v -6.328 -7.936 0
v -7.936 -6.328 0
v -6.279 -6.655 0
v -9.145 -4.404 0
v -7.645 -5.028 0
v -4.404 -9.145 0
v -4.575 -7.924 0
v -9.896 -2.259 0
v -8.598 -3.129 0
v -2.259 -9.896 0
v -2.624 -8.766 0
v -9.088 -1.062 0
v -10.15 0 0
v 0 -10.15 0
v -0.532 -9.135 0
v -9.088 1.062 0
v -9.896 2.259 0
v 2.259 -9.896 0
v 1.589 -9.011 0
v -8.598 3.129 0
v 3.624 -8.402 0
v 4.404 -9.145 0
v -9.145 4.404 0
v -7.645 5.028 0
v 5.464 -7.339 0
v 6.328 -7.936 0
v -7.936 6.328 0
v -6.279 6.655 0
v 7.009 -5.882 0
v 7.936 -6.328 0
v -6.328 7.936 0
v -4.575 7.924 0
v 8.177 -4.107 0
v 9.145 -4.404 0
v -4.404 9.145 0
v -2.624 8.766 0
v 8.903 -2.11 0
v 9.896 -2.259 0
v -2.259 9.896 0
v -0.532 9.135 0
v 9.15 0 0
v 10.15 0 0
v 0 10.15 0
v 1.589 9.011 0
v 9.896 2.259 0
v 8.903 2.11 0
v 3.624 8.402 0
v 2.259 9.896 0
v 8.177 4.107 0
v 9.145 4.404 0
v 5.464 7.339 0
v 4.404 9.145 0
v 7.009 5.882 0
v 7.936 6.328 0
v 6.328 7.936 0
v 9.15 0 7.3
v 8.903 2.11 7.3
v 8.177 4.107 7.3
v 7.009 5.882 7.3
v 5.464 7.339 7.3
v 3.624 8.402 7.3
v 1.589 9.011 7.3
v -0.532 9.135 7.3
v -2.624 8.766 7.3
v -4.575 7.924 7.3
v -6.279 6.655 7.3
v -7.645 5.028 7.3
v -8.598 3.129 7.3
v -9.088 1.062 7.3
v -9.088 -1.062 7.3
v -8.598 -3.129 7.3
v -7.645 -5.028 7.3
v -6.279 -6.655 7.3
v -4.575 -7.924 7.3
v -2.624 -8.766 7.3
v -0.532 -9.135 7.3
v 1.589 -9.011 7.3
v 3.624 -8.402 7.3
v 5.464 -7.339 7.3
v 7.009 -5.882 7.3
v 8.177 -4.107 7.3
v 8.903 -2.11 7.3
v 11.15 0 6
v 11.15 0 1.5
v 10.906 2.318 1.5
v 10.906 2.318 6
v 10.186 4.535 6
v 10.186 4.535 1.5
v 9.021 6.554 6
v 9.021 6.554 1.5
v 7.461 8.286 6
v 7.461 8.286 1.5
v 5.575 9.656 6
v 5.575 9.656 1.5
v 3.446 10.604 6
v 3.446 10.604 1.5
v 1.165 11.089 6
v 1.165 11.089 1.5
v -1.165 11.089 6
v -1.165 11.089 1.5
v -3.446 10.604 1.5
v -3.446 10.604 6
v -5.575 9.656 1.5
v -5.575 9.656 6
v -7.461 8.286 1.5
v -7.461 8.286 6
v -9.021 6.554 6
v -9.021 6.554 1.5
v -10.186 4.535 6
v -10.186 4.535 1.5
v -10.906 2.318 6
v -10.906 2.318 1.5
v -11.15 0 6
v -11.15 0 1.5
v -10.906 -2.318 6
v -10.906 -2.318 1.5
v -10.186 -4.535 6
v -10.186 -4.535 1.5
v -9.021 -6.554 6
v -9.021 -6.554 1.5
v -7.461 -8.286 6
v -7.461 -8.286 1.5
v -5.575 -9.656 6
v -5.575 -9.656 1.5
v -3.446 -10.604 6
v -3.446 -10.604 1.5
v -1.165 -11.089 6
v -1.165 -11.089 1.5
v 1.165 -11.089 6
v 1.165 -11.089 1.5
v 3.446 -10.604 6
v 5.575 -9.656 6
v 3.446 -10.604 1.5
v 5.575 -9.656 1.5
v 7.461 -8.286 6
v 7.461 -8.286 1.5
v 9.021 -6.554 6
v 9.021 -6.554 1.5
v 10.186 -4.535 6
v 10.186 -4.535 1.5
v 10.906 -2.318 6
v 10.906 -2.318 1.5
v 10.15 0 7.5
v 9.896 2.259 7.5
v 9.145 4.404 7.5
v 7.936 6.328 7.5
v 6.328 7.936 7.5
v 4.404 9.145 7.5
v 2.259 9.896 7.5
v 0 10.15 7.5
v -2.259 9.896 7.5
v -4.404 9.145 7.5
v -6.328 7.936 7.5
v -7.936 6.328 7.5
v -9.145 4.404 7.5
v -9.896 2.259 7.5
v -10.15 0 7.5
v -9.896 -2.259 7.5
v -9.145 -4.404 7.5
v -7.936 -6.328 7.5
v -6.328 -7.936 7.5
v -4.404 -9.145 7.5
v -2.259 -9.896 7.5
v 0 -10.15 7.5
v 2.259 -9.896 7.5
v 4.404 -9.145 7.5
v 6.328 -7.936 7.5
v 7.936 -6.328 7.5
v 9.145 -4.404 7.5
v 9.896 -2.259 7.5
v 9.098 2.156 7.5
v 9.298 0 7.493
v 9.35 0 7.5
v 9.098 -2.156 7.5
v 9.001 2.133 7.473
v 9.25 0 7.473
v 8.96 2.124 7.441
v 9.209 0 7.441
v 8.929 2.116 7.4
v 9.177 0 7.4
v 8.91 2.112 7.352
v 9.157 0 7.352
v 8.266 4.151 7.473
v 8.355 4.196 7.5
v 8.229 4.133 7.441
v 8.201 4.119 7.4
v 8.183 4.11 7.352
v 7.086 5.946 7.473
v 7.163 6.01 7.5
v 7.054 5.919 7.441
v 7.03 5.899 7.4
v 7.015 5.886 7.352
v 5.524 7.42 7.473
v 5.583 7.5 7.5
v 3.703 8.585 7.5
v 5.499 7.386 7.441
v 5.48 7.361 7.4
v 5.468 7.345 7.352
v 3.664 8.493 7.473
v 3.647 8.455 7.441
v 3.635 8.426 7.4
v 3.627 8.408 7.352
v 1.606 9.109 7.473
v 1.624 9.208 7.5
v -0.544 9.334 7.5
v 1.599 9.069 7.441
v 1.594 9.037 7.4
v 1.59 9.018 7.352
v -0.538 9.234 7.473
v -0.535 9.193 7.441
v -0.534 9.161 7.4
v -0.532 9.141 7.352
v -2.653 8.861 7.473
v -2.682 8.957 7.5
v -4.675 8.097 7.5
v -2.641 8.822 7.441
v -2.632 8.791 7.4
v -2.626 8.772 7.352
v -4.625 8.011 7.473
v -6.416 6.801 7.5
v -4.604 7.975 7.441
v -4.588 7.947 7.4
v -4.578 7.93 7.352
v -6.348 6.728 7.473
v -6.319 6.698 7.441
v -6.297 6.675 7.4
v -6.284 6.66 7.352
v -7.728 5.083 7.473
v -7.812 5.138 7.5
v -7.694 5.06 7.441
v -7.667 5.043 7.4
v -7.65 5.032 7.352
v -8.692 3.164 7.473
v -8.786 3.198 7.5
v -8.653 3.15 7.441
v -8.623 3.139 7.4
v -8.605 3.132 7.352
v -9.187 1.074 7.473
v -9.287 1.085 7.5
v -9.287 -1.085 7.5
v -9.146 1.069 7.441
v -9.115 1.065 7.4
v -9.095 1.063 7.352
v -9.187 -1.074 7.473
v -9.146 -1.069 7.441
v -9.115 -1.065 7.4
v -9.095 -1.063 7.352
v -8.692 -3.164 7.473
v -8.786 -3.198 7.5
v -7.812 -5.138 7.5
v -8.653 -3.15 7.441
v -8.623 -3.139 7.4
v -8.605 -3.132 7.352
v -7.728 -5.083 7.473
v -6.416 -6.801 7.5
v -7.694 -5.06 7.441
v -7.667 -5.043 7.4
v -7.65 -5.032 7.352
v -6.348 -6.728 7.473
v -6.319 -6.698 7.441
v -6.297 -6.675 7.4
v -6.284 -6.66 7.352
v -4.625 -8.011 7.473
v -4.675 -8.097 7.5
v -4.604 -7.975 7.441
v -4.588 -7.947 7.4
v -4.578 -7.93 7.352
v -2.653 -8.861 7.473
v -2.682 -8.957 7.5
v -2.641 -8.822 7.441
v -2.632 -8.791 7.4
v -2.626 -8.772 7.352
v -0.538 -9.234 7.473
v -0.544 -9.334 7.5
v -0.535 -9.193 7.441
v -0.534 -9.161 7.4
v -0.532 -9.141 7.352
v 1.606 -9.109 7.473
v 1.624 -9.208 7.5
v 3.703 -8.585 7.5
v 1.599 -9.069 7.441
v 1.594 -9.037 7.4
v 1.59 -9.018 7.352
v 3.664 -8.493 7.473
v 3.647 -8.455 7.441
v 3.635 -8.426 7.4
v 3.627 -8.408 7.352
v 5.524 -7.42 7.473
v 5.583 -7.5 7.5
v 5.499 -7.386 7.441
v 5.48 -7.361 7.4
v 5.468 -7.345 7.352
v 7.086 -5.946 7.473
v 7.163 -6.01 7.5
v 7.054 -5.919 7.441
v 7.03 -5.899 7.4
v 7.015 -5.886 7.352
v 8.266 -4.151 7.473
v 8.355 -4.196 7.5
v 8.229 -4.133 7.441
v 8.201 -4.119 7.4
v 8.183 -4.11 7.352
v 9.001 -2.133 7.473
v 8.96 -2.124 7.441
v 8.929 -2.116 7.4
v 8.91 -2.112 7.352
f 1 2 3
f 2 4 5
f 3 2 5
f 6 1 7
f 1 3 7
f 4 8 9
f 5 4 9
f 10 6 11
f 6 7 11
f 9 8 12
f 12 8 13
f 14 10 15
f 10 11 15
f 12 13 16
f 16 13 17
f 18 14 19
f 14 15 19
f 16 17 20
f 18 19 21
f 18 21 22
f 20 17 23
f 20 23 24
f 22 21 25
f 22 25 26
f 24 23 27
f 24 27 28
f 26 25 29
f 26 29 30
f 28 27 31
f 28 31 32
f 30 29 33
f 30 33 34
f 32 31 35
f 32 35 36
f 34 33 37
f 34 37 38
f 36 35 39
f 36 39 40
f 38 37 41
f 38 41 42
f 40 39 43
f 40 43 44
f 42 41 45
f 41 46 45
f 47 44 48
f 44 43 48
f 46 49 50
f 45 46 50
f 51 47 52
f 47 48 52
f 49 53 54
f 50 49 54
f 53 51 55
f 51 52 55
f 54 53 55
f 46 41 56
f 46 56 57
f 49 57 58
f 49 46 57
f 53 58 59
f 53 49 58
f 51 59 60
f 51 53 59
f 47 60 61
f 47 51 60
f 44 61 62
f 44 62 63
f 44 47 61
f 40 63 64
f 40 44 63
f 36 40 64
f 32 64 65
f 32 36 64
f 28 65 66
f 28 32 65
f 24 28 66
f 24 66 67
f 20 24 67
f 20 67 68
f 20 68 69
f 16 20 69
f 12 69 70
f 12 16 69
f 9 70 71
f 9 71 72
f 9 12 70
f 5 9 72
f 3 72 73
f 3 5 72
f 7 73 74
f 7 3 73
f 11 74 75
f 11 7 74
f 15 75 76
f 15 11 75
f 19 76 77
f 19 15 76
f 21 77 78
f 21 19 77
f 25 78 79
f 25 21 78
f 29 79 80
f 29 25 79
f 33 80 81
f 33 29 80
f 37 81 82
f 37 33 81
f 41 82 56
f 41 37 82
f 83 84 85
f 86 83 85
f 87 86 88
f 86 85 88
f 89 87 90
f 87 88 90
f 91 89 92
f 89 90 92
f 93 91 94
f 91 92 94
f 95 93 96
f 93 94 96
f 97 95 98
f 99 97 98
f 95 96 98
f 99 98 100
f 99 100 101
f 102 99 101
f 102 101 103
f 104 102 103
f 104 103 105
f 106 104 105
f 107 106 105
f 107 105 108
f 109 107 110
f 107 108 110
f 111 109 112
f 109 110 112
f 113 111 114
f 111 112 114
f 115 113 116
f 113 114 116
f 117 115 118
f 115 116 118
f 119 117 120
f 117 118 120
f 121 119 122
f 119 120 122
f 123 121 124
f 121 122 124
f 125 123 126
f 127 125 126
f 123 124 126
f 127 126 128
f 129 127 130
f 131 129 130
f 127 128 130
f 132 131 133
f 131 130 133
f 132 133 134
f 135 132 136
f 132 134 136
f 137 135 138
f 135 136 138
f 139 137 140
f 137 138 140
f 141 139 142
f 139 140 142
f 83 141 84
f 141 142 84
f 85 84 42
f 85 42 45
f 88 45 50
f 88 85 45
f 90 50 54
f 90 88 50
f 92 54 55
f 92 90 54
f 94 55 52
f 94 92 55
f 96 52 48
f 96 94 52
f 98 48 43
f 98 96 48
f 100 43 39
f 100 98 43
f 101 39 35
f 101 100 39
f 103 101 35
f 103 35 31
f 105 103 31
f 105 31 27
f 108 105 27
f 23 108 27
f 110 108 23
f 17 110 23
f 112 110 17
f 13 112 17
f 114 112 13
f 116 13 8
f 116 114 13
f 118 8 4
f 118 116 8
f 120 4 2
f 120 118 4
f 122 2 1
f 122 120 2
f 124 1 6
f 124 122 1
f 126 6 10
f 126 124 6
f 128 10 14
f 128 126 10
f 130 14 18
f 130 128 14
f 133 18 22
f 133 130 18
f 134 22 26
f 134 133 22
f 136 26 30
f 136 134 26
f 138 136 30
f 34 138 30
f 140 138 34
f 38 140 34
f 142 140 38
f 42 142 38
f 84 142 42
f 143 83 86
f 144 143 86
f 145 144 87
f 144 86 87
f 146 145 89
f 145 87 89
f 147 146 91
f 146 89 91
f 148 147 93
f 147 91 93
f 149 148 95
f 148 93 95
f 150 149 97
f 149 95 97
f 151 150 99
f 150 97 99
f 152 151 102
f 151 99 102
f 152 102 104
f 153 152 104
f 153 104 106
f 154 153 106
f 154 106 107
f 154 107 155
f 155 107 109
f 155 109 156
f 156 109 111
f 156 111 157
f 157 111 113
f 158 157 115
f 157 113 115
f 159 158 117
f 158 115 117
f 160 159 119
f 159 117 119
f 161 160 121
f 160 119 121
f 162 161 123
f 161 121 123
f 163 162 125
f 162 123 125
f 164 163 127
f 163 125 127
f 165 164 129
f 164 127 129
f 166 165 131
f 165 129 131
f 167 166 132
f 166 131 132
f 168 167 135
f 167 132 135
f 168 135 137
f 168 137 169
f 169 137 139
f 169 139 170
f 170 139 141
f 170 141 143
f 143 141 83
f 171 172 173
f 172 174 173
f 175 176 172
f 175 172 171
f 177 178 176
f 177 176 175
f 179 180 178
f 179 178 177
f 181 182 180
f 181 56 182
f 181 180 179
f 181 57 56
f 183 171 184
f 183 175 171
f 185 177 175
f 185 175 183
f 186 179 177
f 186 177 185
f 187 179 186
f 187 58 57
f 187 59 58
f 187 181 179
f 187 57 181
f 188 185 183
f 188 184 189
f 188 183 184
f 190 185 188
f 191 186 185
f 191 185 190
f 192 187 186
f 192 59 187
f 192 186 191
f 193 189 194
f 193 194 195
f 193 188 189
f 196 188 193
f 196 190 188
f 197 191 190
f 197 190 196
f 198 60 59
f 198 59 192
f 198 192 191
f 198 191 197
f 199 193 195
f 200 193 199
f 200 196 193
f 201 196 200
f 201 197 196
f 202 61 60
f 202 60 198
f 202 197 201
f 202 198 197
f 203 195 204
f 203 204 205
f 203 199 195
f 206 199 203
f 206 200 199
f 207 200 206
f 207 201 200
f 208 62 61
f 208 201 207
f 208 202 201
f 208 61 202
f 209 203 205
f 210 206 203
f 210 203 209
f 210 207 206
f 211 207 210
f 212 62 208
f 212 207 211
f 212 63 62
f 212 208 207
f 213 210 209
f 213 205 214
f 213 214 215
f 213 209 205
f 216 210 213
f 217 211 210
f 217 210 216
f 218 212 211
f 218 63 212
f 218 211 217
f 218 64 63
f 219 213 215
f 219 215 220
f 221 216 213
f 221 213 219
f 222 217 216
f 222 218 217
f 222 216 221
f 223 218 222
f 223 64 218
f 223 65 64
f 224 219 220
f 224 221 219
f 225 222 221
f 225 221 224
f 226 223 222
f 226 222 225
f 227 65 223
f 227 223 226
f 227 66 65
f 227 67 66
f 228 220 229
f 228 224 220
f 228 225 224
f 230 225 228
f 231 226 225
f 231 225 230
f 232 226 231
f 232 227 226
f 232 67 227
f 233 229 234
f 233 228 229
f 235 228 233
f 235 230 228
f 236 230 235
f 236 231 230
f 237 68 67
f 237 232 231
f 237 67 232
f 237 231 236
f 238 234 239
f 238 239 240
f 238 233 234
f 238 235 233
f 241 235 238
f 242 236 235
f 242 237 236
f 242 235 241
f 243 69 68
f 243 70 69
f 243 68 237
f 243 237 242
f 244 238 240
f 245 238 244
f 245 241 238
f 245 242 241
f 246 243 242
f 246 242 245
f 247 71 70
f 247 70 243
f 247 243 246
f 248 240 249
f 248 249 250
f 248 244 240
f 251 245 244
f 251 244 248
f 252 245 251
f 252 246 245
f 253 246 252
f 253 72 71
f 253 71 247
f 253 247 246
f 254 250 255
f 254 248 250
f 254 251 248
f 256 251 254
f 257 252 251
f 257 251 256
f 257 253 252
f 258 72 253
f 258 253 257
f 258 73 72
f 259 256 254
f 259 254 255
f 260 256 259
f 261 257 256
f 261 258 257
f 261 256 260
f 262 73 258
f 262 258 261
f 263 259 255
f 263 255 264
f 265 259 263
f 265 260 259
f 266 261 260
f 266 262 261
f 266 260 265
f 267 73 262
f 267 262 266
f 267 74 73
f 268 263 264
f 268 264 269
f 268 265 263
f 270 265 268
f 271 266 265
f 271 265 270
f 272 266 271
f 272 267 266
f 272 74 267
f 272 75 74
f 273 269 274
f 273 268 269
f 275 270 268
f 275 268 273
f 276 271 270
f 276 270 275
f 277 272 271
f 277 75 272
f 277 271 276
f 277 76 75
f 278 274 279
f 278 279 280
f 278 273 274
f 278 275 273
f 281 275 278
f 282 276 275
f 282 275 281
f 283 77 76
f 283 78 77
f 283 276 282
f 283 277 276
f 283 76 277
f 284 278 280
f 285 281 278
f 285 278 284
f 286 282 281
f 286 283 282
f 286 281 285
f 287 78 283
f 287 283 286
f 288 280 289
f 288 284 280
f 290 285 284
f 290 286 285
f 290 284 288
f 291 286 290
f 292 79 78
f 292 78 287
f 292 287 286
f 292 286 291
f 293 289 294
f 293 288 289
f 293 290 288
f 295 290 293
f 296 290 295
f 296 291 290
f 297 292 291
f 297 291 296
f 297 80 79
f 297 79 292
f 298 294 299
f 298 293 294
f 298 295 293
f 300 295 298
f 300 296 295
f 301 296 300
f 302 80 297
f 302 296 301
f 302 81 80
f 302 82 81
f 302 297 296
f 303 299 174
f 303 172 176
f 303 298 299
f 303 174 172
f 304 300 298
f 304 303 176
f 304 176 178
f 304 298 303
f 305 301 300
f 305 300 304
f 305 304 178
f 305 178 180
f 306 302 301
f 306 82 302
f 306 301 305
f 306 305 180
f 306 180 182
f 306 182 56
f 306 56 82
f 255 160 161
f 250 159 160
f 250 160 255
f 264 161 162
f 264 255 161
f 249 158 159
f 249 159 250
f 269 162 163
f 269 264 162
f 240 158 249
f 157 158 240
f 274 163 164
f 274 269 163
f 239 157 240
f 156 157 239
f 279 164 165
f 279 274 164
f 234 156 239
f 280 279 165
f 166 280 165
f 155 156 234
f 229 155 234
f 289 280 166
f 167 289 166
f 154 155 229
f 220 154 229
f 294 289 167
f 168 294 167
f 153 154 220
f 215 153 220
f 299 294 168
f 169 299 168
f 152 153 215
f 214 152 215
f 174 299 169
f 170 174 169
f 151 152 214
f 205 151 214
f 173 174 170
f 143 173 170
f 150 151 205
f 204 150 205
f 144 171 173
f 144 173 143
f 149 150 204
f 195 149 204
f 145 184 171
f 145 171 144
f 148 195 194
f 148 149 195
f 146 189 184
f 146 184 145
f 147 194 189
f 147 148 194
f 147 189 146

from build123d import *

# Parameters (mm, degrees)
F0_R       = 11.15
F0_R_2     = 9.15
F1_DEPTH   = 7.5
F2_SIZE2   = 1.5
F2_SIZE    = 1
F2_2_SIZE2 = 1.5
F2_2_SIZE  = 1
F3_R       = 0.2


# Not quite as in the source:
# - a feature names something its author has since deleted; it is built from what else it names


with BuildPart() as f1:
    # F0 (on Top) → F1 (new body)
    with BuildSketch(Plane.XY):
        Circle(F0_R)
        Circle(F0_R_2, mode=Mode.SUBTRACT)
    extrude(amount=F1_DEPTH)

    # F2
    f2_edges = [f1.edges().sort_by_distance(p)[0] for p in [
        (-11.15, 0, 7.5),
    ]]
    f2_side = f1.faces().sort_by_distance((-10.83463, 0, 7.5))[0]
    chamfer(f2_edges, length=F2_SIZE, length2=F2_SIZE2, reference=f2_side)

    # F2#2
    f2_2_edges = [f1.edges().sort_by_distance(p)[0] for p in [
        (-11.15, 0, 0),
    ]]
    f2_2_side = f1.faces().sort_by_distance((-10.83463, 0, 0))[0]
    chamfer(f2_2_edges, length=F2_2_SIZE, length2=F2_2_SIZE2, reference=f2_2_side)

    # F3
    f3_edges = [f1.edges().sort_by_distance(p)[0] for p in [
        (-9.15, 0, 7.5),
    ]]
    fillet(f3_edges, radius=F3_R)


solid = f1.part
